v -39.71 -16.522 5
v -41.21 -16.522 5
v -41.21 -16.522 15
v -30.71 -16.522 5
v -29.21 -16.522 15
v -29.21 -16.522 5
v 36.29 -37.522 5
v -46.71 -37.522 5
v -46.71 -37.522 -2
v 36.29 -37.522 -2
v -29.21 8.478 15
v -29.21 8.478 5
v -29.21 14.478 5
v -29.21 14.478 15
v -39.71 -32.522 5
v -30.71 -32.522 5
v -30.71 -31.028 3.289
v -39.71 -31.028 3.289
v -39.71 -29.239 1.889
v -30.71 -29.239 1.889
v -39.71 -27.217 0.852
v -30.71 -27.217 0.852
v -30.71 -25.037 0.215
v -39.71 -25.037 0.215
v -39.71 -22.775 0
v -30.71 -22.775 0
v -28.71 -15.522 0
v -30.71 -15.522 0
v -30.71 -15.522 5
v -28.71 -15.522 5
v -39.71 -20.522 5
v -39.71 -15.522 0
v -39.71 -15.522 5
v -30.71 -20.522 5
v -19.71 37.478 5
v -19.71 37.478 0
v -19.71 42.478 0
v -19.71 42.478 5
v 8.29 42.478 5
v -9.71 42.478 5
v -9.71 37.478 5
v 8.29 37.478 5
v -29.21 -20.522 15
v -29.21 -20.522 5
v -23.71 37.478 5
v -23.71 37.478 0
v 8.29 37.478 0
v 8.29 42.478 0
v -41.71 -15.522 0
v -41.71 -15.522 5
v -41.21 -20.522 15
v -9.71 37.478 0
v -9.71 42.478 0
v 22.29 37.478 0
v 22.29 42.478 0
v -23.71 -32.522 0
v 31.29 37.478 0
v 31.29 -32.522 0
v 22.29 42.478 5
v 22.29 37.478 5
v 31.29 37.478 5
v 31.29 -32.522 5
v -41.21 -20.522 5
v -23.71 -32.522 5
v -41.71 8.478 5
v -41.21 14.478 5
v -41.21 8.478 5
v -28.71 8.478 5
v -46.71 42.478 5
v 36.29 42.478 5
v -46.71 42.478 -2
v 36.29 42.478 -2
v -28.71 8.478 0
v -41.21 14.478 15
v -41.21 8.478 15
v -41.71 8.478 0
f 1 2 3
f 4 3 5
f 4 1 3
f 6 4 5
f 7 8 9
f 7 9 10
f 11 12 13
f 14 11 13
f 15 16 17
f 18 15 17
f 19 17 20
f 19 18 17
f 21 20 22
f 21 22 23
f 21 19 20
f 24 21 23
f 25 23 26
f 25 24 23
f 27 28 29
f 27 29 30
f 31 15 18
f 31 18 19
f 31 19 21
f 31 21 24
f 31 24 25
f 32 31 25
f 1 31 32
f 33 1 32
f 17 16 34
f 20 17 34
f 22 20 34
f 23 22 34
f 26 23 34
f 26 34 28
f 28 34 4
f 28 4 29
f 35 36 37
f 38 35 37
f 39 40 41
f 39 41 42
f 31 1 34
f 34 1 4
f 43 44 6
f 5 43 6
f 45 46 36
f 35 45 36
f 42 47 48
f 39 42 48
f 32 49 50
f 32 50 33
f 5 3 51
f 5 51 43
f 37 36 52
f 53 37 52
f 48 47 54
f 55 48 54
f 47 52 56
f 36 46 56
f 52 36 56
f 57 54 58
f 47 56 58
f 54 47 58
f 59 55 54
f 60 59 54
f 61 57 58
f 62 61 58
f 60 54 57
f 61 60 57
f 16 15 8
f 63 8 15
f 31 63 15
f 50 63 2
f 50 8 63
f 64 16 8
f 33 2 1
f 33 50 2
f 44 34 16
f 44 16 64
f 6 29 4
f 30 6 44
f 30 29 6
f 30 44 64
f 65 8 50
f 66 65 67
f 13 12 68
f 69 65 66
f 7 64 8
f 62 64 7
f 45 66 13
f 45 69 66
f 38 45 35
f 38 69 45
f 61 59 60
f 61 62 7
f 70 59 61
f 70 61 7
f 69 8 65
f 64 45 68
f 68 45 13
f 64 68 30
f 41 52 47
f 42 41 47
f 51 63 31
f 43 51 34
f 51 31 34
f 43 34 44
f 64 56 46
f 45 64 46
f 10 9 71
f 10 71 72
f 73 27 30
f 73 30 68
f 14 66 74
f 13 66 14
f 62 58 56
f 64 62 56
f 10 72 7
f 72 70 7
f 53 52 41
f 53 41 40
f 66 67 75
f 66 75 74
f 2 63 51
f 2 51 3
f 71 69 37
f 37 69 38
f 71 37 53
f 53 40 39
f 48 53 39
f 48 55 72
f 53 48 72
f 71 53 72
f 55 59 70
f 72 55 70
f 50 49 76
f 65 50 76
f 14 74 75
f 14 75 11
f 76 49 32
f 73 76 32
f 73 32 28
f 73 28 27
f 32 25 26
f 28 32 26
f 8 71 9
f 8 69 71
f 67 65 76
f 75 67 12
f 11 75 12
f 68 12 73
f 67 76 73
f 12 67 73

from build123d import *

# Parameters (mm, degrees)
F0_W         = 13
F0_H         = 24
F1_DEPTH     = 5
F0_W_2       = 18
F0_H_2       = 5
F2_W         = 83
F2_H         = 80
F3_DEPTH     = 2
F4_W         = 9
F4_H         = 17
F5_DEPTH     = 5
F6_W         = 12
F6_H         = 6
F7_DEPTH     = 10
F8_W         = 12
F8_H         = 4
F9_DEPTH     = 10
F10_T1_DEPTH = 9


# Not quite as in the source:
# - a fillet or chamfer that OpenCascade refuses, or shapes differently, is made with other operations: its cross-section is extruded or revolved along the edge and cut away or added


with BuildPart() as f1:
    # F0 (on Top) → F1 (new body)
    with BuildSketch(Plane.XY):
        Polygon((-19.7103468106, 42.4778270721), (-46.7103468106, 42.4778270721), (-46.7103468106, -37.5221729279), (36.2896531894, -37.5221729279), (36.2896531894, 42.4778270721), (22.2896531894, 42.4778270721), (22.2896531894, 37.4778270721), (31.2896531894, 37.4778270721), (31.2896531894, -32.5221729279), (-23.7103468106, -32.5221729279), (-23.7103468106, 37.4778270721), (-19.7103468106, 37.4778270721), align=None)
        with Locations((-35.2103468106, -3.5221729279)):
            Rectangle(F0_W, F0_H, mode=Mode.SUBTRACT)
    extrude(amount=F1_DEPTH)



with BuildPart() as f1b:
    # F0 (on Top) → F1, piece 2 (new body)
    with BuildSketch(Plane.XY):
        with Locations((-0.7103468106, 39.9778270721)):
            Rectangle(F0_W_2, F0_H_2)
    extrude(amount=F1_DEPTH)


with BuildPart() as f1_1:
    add(f1.part)

    add(f1b.part)  # F3 merges F1b
    # F2 (on face) → F3 (join)
    with BuildSketch(Plane(origin=(0, 0, 0), x_dir=(1, 0, 0), z_dir=(0, 0, -1))):
        with Locations((-5.2103468106, -2.4778270721)):
            Rectangle(F2_W, F2_H)
    extrude(amount=F3_DEPTH)

    # F4 (on face) → F5 (cut)
    with BuildSketch(Plane.XY.offset(5)):
        with Locations((-35.2103468106, -24.0221729279)):
            Rectangle(F4_W, F4_H)
    extrude(amount=-F5_DEPTH, mode=Mode.SUBTRACT)

    # F6 (on face) → F7 (join)
    with BuildSketch(Plane.XY.offset(5)):
        with Locations((-35.2103468106, 11.4778270721)):
            Rectangle(F6_W, F6_H)
    extrude(amount=F7_DEPTH)

    # F8 (on face) → F9 (join)
    with BuildSketch(Plane.XY.offset(5)):
        with Locations((-35.2103468106, -18.5221729279)):
            Rectangle(F8_W, F8_H)
    extrude(amount=F9_DEPTH)

    # F10: fillet of radius 12 on 1 edges, made by hand

    # F10_s2 → F10_t1 (join)
    with BuildSketch(Plane.YZ.offset(-39.7103468106)):
        with BuildLine():
            ThreePointArc((-32.5221729279, 5), (-28.2526041581, 1.322921748), (-22.775378583, 0))
            Line((-22.775378583, 0), (-32.5221729279, 0))
            Line((-32.5221729279, 0), (-32.5221729279, 5))
        make_face()
    extrude(amount=F10_T1_DEPTH)


solid = f1_1.part
